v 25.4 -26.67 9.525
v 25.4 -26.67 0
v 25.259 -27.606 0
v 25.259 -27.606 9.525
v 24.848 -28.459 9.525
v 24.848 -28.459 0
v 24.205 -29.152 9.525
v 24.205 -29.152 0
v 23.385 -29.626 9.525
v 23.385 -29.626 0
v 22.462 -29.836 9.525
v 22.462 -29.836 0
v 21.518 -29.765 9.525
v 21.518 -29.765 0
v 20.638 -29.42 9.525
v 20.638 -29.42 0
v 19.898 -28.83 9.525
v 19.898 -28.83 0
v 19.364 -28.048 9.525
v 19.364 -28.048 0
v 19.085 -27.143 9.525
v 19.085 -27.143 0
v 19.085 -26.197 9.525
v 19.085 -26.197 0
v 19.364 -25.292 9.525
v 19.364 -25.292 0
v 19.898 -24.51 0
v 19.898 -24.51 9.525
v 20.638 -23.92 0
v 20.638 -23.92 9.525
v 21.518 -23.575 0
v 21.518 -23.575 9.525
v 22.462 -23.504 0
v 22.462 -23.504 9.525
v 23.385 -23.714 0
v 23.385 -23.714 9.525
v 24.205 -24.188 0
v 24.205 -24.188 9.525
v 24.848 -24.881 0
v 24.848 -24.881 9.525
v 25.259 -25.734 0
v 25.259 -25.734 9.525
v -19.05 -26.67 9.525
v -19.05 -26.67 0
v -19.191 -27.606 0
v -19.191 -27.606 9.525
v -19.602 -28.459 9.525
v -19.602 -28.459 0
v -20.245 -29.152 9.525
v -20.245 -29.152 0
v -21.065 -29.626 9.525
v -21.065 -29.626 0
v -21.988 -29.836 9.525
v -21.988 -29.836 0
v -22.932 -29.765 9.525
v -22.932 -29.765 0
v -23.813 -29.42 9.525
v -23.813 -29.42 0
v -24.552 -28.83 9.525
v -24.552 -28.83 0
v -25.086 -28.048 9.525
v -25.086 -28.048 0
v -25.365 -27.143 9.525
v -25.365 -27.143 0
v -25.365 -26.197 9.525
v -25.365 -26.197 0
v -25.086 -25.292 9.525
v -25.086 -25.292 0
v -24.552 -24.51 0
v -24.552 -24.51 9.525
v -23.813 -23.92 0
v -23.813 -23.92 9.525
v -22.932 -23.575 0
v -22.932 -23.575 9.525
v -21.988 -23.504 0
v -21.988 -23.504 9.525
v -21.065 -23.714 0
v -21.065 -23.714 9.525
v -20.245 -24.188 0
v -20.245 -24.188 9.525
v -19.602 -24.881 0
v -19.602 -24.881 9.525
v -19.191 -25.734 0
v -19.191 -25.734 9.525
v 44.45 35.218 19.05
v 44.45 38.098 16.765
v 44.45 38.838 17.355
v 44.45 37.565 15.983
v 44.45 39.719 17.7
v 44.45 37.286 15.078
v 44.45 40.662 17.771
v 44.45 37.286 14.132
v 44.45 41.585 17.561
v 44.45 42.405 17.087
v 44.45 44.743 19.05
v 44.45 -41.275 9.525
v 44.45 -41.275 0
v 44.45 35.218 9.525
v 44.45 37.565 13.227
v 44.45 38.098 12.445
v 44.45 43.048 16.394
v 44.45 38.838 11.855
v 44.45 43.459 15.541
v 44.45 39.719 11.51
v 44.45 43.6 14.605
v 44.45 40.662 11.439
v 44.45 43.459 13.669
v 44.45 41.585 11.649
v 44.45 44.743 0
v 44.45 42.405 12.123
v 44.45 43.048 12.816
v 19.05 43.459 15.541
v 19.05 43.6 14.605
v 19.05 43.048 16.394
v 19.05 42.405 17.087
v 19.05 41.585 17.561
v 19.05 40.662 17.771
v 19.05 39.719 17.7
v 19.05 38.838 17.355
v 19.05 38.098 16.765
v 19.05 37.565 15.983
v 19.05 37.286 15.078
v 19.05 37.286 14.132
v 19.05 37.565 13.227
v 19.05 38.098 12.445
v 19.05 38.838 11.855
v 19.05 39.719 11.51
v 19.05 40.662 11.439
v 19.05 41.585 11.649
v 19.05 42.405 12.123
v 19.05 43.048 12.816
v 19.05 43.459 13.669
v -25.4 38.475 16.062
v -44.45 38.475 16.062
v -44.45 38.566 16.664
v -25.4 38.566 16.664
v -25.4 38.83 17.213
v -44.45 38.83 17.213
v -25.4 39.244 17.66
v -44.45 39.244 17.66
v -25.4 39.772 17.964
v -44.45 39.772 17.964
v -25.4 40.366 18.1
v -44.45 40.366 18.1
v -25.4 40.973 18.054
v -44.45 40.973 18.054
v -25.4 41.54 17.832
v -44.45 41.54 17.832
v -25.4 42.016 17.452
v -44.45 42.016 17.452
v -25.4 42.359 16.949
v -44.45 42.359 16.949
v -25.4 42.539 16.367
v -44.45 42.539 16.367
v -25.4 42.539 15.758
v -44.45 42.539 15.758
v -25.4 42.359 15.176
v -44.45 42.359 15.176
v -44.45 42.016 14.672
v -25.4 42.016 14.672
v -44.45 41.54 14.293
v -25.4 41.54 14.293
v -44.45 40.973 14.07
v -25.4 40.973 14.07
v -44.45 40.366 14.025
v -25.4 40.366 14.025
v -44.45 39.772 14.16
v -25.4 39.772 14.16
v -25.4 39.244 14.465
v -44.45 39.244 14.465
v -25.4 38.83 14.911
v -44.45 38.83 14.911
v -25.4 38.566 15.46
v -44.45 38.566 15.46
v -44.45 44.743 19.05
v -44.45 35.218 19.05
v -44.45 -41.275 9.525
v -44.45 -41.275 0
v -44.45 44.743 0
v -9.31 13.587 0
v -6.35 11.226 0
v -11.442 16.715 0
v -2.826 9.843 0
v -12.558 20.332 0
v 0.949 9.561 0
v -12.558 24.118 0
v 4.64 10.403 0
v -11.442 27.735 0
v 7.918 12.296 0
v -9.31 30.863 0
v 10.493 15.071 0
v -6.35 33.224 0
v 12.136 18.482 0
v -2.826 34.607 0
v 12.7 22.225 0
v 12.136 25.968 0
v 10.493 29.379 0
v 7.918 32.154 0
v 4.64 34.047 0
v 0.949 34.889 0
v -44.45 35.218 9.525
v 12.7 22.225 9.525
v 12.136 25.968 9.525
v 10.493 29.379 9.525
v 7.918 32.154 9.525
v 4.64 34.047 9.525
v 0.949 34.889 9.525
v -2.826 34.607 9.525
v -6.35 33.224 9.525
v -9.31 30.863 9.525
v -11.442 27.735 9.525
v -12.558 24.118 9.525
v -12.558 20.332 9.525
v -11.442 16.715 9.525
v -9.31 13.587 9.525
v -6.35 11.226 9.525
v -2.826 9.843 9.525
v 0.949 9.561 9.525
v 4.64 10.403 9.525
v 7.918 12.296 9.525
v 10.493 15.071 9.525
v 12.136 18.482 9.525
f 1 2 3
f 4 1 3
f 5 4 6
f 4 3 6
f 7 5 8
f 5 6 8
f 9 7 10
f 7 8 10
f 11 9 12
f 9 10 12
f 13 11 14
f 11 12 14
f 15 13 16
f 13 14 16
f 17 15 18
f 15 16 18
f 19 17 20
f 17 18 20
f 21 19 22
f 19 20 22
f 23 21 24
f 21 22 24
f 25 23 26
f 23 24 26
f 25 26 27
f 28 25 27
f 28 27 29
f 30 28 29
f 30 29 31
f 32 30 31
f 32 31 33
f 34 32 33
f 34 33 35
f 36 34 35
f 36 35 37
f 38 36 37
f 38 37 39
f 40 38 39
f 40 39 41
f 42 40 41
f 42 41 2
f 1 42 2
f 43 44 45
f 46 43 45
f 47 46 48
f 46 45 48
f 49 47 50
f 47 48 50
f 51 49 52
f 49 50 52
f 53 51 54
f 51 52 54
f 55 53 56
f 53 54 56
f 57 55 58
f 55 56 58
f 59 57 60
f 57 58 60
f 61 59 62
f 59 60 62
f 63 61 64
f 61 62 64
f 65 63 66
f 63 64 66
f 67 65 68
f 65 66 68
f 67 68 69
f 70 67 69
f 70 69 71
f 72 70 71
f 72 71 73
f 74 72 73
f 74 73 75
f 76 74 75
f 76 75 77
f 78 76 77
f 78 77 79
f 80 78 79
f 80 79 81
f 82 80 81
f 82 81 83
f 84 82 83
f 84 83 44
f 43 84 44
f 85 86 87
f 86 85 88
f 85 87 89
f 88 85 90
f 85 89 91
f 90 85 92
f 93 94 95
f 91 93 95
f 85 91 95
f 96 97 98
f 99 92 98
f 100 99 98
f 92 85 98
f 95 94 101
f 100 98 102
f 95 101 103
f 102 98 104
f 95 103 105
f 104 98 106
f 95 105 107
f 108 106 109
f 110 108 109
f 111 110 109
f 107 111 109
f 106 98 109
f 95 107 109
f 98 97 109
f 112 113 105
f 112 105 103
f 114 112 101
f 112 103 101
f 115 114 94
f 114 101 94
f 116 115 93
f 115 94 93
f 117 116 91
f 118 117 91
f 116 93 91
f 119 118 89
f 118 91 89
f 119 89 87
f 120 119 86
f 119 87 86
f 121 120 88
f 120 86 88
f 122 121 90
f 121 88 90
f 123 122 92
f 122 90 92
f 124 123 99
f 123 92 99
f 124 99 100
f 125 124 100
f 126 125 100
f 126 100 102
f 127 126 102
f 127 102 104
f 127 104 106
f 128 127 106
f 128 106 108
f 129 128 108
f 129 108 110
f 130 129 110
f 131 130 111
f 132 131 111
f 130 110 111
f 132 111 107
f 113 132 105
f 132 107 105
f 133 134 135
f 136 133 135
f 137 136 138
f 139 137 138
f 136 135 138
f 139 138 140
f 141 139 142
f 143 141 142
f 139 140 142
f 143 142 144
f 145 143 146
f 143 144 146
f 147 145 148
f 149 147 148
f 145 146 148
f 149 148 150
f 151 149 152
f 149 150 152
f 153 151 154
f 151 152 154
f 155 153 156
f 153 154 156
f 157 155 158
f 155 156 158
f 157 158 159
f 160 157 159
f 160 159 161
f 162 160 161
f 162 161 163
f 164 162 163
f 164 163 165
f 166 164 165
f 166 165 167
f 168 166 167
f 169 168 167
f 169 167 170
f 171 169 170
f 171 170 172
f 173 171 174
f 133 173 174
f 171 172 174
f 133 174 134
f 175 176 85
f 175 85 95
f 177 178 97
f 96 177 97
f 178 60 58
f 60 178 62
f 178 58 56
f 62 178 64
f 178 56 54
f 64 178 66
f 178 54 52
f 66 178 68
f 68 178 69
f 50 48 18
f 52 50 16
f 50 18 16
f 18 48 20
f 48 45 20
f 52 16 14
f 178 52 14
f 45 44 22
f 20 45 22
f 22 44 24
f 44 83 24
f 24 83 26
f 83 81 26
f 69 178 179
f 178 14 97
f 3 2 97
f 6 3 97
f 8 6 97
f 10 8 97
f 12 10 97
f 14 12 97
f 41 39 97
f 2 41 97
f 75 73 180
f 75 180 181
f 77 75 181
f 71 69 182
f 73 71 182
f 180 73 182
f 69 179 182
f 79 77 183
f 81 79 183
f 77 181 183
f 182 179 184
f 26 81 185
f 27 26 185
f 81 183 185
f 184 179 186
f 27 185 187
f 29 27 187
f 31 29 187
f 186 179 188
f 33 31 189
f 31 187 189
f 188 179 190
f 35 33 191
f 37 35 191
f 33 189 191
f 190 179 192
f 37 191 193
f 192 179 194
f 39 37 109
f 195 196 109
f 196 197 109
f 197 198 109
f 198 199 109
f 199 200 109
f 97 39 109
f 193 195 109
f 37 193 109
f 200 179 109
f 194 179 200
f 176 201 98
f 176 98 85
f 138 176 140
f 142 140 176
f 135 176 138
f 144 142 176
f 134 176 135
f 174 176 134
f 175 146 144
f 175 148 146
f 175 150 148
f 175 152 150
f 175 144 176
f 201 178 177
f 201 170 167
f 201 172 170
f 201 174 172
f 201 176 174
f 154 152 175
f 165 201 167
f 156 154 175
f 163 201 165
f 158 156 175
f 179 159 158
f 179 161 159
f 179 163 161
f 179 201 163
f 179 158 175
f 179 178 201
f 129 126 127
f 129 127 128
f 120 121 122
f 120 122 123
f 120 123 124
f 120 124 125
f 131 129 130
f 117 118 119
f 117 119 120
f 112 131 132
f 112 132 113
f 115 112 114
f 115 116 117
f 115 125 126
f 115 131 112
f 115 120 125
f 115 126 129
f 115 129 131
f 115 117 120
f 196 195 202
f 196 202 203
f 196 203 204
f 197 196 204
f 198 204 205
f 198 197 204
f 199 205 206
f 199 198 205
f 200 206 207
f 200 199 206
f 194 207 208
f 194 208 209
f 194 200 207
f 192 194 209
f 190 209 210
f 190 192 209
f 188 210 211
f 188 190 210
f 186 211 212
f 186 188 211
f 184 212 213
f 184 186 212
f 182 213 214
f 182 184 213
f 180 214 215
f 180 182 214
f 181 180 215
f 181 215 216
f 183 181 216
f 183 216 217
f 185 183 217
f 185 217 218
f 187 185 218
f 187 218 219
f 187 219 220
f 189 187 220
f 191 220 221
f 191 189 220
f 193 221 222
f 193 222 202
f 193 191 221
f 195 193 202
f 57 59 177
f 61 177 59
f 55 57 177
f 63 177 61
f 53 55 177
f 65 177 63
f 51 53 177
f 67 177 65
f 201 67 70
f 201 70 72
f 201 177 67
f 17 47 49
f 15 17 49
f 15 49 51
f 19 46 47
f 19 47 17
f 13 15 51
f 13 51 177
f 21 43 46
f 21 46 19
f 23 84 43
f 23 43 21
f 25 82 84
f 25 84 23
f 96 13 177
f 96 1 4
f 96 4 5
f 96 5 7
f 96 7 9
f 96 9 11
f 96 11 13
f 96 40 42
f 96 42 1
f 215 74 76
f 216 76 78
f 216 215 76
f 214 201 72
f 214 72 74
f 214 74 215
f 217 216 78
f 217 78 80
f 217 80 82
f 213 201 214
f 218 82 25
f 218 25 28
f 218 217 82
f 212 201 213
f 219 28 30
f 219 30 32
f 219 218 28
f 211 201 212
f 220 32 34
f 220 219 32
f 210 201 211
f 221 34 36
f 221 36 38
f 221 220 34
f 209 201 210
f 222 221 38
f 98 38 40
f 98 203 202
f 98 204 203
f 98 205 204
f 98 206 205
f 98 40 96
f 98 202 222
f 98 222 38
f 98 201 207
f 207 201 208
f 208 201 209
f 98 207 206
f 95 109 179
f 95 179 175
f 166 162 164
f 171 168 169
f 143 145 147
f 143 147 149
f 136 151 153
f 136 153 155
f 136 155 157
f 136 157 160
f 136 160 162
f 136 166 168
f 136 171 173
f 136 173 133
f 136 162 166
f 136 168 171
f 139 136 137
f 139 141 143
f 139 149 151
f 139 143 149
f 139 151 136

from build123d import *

# Parameters (mm, degrees)
F0_W     = 88.9
F0_H     = 82.55
F0_R     = 12.7
F2_DEPTH = 9.525
F1_W     = 9.525
F1_H     = 19.05
F3_DEPTH = 44.45
F4_R     = 3.175
F5_DEPTH = 25.4
F6_R     = 2.0432827377
F7_DEPTH = 19.05
F8_R     = 3.175
F9_DEPTH = 19.051


with BuildPart() as f2:
    # F0 (on Top) → F2 (new body)
    with BuildSketch(Plane.XY):
        Rectangle(F0_W, F0_H)
        with Locations((0, 22.225)):
            Circle(F0_R, mode=Mode.SUBTRACT)
    extrude(amount=F2_DEPTH)

    # F1 (on Right) → F3 (join, symmetric)
    with BuildSketch(Plane.YZ):
        with Locations((39.9805786431, 9.525)):
            Rectangle(F1_W, F1_H)
    extrude(amount=F3_DEPTH, both=True)

    # F4 (on face) → F5 (cut)
    with BuildSketch(Plane.YZ.offset(44.45)):
        with Locations((40.4250786431, 14.605)):
            Circle(F4_R)
    extrude(amount=-F5_DEPTH, mode=Mode.SUBTRACT)

    # F6 (on face) → F7 (cut)
    with BuildSketch(Plane(origin=(-44.45, 0, 0), x_dir=(0, -1, 0), z_dir=(-1, 0, 0))):
        with Locations((-40.5182726681, 16.0620938987)):
            Circle(F6_R)
    extrude(amount=-F7_DEPTH, mode=Mode.SUBTRACT)

    # F8 (on face) → F9 (cut, through all)
    with BuildSketch(Plane(origin=(0, 0, 0), x_dir=(1, 0, 0), z_dir=(0, 0, -1))):
        with Locations((22.2250018269, 26.67)):
            Circle(F8_R)
        with Locations((-22.225, 26.67)):
            Circle(F8_R)
    extrude(amount=-F9_DEPTH, mode=Mode.SUBTRACT)


solid = f2.part
